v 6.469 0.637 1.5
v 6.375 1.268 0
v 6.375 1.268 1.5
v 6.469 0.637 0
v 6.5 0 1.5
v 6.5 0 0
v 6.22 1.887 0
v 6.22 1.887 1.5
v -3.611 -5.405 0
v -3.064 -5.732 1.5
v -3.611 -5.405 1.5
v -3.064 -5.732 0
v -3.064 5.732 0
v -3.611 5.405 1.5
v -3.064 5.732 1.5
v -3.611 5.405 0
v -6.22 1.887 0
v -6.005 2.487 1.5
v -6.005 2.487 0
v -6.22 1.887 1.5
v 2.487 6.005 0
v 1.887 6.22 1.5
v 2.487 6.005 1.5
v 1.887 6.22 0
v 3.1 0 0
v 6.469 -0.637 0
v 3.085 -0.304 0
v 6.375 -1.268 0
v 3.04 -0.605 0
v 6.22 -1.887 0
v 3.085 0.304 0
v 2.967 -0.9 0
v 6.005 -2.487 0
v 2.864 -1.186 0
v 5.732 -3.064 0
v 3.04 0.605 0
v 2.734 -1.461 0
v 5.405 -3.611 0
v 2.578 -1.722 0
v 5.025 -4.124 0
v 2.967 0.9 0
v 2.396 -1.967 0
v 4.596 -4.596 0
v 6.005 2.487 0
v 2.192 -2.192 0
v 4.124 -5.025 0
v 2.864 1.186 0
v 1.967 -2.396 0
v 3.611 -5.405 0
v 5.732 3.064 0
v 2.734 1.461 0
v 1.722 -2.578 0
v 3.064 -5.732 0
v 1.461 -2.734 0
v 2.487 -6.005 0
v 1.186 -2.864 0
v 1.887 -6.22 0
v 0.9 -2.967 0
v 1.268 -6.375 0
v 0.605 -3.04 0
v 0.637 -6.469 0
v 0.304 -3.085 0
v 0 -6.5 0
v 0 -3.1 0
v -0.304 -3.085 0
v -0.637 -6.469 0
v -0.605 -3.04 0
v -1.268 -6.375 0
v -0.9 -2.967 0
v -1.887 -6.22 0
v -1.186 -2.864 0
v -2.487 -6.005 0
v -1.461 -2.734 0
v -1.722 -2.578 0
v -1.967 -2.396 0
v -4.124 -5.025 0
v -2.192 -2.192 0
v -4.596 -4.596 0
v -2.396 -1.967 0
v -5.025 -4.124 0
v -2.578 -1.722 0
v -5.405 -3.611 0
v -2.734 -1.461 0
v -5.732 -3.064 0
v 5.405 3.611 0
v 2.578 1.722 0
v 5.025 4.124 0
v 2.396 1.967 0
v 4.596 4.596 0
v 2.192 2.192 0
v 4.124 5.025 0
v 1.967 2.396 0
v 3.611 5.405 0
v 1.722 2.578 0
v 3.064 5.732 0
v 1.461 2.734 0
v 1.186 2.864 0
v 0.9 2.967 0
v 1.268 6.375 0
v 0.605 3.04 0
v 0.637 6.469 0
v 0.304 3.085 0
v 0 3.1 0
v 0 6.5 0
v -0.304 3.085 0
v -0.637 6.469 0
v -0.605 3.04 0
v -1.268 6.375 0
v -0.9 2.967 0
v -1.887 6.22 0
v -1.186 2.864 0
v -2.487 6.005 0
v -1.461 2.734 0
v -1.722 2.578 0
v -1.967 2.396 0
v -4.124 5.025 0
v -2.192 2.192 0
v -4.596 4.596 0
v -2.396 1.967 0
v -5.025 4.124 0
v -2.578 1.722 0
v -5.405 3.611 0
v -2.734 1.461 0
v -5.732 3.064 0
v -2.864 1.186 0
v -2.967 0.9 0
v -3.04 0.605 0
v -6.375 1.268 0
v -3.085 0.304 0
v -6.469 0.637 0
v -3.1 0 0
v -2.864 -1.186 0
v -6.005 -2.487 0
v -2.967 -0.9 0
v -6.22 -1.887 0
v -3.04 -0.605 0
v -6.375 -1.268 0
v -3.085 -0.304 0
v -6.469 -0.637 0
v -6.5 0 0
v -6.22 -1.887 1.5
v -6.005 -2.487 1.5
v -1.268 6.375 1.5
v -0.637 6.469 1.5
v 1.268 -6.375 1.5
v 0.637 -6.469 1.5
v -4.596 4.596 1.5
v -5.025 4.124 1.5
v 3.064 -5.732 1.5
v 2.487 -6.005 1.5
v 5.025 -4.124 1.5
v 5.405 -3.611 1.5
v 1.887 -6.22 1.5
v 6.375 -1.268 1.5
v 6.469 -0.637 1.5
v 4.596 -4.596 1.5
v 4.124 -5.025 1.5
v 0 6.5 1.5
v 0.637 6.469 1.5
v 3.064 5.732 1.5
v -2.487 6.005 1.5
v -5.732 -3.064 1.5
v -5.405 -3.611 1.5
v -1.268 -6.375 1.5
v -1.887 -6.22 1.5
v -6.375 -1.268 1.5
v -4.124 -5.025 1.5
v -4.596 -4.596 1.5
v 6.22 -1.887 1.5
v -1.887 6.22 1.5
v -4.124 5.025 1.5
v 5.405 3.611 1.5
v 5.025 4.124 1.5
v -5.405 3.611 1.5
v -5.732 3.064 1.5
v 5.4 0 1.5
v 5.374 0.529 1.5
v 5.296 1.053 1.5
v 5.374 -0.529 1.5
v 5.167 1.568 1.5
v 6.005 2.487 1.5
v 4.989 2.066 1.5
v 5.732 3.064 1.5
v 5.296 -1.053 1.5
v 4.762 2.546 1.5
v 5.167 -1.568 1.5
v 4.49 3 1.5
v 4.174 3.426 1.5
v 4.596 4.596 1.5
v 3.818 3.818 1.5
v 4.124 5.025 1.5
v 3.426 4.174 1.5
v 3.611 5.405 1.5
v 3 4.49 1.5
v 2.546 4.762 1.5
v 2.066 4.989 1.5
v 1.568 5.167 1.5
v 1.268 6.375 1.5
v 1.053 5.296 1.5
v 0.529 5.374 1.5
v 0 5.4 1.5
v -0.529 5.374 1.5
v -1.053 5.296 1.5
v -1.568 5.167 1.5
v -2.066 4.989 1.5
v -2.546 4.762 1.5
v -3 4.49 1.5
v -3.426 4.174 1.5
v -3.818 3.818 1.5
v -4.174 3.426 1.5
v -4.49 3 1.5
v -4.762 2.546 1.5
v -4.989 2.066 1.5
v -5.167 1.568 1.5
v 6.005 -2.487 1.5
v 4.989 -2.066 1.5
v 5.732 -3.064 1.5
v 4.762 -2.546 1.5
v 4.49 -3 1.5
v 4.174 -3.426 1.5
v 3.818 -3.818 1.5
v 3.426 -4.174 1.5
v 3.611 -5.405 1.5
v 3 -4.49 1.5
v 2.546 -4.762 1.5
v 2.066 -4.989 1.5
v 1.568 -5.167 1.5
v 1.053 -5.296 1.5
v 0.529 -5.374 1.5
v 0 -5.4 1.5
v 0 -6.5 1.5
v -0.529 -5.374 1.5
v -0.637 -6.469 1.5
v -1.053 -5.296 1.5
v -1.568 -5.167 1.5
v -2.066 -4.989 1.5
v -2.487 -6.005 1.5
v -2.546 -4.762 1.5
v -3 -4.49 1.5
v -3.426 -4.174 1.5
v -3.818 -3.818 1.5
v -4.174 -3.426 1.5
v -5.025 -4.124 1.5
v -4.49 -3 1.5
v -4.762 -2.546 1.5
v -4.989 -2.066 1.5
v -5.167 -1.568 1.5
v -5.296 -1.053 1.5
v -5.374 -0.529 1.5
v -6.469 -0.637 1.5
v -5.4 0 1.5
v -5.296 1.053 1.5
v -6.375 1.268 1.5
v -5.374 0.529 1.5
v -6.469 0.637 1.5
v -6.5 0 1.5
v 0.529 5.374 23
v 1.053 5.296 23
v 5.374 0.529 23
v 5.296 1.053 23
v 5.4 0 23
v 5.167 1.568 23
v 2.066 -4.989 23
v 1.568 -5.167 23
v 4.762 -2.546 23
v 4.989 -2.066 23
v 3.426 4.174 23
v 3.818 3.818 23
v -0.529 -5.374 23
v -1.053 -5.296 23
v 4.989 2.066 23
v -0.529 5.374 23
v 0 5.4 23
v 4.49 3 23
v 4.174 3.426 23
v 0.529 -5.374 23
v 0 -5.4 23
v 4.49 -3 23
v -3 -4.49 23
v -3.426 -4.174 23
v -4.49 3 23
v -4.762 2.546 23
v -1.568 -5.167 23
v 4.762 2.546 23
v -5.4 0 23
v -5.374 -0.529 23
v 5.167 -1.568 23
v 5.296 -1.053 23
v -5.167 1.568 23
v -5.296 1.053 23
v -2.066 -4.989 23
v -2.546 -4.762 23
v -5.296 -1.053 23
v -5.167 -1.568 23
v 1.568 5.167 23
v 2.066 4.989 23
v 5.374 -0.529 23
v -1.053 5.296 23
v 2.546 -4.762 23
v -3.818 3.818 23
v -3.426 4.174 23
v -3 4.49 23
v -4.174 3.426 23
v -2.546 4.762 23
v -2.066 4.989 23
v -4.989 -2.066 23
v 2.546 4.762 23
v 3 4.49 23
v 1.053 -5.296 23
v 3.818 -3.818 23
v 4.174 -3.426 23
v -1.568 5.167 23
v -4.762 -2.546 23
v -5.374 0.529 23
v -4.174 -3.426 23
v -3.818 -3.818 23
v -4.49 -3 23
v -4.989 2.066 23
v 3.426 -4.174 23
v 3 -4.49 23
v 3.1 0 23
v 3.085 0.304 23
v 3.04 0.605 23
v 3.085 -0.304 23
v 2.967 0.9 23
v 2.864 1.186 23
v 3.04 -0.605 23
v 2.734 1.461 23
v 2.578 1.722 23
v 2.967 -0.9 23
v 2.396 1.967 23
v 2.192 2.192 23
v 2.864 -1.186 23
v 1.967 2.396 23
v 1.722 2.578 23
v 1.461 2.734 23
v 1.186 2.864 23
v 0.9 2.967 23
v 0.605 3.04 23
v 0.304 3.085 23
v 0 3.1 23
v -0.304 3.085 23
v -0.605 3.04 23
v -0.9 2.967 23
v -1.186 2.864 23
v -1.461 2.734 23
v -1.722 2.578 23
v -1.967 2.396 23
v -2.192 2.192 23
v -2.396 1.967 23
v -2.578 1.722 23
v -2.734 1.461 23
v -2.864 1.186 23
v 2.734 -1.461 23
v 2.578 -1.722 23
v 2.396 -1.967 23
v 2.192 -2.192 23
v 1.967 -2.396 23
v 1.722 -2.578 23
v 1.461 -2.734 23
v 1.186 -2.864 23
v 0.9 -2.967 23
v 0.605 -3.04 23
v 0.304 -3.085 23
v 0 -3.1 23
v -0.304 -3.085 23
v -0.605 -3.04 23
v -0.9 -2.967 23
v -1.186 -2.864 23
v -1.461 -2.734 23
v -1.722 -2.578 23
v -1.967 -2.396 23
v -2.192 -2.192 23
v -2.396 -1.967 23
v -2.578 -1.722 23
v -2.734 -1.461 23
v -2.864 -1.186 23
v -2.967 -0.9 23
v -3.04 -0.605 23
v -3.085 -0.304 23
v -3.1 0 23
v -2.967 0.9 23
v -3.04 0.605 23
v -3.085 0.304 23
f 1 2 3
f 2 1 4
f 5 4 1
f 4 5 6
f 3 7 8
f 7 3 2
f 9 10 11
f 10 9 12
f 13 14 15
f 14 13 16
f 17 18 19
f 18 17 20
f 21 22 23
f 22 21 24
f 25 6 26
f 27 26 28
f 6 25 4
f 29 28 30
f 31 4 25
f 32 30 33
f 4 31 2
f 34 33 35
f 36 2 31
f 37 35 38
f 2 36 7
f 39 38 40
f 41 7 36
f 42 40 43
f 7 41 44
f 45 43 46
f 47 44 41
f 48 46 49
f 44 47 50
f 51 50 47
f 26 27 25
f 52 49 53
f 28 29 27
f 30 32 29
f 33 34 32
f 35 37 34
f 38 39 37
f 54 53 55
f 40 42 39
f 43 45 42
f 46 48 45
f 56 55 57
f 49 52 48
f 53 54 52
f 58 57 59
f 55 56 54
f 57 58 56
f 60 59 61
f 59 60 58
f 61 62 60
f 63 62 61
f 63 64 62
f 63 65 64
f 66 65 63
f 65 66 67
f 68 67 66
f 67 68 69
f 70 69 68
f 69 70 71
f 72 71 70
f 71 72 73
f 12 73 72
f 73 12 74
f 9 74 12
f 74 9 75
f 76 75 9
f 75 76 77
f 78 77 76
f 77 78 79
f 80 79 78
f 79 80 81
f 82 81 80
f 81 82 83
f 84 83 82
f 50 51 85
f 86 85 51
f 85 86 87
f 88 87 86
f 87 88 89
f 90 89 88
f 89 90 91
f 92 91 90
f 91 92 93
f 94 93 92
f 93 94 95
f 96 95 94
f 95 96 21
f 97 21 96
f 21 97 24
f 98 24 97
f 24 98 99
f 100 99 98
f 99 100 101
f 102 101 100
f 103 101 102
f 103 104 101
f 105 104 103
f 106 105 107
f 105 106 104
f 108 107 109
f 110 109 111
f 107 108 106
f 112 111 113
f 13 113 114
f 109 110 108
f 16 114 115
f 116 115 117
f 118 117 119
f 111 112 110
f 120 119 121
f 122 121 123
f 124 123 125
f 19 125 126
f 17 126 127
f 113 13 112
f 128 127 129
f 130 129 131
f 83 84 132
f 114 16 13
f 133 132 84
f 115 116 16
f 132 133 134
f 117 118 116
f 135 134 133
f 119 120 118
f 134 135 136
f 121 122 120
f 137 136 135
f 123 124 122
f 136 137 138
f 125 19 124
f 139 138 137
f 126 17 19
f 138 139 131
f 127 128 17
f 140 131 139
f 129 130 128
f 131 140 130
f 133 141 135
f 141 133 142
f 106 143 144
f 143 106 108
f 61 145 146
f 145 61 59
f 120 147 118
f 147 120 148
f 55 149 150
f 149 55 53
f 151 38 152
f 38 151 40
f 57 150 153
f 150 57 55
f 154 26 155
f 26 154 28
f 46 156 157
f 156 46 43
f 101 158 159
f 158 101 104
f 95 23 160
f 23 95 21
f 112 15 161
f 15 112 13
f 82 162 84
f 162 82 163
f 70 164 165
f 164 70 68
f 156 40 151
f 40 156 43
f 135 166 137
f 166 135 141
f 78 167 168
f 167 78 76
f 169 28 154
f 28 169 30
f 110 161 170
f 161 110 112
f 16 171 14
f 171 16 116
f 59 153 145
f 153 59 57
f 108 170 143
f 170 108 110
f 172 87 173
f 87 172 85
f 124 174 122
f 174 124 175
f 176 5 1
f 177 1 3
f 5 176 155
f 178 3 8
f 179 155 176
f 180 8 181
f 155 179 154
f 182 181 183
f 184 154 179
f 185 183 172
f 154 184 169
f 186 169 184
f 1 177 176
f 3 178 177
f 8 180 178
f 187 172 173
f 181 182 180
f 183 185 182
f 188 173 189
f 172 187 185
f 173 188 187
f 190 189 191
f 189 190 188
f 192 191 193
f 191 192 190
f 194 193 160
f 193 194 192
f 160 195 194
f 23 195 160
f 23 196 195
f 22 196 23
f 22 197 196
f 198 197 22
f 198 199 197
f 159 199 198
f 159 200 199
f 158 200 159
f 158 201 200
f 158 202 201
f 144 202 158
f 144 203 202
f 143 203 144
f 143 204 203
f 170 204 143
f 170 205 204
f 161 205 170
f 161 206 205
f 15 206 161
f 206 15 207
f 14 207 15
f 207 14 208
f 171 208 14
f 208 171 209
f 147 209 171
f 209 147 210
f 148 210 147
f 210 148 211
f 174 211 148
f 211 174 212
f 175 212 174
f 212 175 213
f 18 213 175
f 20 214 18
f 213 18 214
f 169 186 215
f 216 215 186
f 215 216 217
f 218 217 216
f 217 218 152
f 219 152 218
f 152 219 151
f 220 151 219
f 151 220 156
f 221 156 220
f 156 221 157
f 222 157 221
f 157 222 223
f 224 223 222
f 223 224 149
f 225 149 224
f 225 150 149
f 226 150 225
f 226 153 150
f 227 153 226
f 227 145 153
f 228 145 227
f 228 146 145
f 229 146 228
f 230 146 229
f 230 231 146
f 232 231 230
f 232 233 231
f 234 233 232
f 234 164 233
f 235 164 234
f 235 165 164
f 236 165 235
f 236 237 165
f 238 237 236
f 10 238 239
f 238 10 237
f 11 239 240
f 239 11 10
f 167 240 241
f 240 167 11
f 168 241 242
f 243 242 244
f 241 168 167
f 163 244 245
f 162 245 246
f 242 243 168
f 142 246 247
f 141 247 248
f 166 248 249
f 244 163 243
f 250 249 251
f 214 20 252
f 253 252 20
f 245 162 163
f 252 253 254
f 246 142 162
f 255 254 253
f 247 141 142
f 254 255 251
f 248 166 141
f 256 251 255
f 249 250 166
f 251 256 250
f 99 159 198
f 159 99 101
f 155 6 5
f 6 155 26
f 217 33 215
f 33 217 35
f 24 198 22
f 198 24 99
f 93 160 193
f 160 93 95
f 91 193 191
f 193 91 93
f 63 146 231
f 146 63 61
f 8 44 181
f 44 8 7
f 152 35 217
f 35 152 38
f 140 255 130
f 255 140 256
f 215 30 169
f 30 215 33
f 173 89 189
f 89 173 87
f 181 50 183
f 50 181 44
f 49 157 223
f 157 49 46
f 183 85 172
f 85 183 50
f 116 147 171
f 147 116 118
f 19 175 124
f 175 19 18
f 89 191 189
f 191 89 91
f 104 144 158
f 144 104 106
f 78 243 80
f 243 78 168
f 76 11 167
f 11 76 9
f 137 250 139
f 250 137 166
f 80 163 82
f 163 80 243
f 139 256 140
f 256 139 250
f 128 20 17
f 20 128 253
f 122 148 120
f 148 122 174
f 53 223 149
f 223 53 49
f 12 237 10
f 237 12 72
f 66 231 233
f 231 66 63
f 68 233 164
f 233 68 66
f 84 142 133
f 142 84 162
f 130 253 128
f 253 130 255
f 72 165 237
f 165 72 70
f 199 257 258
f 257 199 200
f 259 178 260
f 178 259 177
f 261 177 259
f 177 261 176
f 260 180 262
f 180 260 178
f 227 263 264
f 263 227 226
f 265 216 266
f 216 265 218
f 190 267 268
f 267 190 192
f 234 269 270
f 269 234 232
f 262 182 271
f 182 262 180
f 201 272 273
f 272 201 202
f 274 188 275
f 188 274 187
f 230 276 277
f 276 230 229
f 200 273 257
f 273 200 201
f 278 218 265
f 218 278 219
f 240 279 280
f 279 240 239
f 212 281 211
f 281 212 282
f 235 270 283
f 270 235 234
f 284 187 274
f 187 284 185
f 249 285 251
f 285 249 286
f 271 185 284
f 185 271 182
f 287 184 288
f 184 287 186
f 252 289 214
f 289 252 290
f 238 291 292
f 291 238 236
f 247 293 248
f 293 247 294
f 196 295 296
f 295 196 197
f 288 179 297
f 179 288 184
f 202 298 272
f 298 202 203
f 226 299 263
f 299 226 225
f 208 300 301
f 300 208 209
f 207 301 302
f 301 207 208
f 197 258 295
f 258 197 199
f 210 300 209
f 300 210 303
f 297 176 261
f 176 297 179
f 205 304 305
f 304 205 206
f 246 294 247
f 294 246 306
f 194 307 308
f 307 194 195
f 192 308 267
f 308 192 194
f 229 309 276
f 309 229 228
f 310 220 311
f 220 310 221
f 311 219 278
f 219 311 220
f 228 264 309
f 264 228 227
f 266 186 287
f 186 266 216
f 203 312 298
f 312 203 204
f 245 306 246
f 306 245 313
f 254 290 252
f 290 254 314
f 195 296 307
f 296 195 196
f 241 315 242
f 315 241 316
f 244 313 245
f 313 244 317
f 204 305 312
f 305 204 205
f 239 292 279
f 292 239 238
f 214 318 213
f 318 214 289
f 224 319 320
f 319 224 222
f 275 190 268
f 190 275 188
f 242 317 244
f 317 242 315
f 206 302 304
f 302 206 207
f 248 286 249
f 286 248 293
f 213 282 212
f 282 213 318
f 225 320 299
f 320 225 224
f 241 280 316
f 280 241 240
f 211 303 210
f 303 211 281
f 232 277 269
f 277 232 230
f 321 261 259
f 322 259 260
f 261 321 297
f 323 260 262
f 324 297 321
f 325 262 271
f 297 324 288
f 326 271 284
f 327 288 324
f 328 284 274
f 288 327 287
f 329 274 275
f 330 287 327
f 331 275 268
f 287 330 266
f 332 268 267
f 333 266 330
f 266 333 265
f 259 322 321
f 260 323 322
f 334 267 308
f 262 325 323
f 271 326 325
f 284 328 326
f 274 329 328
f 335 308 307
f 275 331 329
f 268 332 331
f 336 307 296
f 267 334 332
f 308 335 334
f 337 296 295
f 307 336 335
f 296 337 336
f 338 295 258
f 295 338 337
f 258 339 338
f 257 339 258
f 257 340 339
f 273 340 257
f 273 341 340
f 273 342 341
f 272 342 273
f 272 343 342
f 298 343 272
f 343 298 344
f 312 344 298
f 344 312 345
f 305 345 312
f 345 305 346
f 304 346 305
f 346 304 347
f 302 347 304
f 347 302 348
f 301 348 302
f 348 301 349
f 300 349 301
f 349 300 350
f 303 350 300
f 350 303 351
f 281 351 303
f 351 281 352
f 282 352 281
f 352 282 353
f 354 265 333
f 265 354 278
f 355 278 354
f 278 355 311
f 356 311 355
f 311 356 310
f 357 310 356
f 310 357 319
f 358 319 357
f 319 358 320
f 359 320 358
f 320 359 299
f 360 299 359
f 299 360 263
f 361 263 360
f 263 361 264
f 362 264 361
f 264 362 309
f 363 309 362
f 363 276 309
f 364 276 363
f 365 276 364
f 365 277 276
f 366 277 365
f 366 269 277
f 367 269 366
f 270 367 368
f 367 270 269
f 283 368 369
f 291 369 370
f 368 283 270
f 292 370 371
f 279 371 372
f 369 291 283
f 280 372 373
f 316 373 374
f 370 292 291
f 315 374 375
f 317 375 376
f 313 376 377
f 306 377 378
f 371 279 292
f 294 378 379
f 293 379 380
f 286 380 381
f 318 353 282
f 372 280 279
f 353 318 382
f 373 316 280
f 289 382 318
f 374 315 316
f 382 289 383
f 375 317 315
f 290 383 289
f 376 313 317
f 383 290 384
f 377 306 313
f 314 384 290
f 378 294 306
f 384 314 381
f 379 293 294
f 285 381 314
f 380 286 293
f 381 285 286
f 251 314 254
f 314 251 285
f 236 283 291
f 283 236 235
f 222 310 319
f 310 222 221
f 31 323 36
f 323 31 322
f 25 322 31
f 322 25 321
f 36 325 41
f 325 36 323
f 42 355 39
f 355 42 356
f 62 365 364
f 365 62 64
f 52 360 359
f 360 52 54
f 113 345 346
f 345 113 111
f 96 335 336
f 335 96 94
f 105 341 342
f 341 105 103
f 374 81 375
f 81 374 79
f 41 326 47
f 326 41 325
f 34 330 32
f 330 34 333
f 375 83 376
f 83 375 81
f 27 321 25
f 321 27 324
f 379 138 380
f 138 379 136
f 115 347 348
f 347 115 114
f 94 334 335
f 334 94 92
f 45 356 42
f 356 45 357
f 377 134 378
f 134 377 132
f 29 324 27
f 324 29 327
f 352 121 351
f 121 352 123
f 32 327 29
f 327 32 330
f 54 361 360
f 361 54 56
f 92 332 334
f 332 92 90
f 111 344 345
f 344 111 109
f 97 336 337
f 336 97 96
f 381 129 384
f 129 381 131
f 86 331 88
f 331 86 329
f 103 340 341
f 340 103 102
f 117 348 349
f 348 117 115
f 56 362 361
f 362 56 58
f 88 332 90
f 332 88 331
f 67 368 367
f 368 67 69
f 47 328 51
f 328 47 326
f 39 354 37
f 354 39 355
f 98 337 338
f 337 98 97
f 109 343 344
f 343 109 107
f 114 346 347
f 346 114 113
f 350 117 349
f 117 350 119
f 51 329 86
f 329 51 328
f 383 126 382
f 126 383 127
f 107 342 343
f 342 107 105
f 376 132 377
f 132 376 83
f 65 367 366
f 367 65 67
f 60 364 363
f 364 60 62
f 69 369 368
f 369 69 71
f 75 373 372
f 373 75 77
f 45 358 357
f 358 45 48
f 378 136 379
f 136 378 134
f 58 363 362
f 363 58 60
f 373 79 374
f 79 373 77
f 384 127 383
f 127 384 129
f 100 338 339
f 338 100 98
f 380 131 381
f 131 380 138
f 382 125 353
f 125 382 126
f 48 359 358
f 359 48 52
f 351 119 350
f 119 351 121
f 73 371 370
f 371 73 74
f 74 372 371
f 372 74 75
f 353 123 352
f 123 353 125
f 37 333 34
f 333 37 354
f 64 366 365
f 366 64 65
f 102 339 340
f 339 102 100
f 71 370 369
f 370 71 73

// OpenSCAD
$fn = 64;

// Dimensions (mm)
collar_od = 13;       // Diameter of the bottom collar
collar_h = 1.5;       // Height of the bottom collar
body_od = 10.8;       // Outer diameter of the main sleeve body
body_h = 21.5;        // Height of the main sleeve body
bore_d = 6.2;         // Diameter of the internal bore

// Derived dimensions
collar_r = collar_od / 2;
body_r = body_od / 2;
bore_r = bore_d / 2;
total_h = collar_h + body_h;

// Construct the adapter
difference() {
    union() {
        // Bottom collar (resting on bed at z=0)
        translate([0, 0, 0])
        cylinder(r = collar_r, h = collar_h);

        // Main body (rising from collar)
        translate([0, 0, collar_h])
        cylinder(r = body_r, h = body_h);
    }

    // Internal bore
    // Height is extended by 1mm to ensure it cuts through the top face of the collar
    // and the top face of the body, satisfying the "extend past faces" rule.
    cylinder(r = bore_r, h = total_h + 1);
}
